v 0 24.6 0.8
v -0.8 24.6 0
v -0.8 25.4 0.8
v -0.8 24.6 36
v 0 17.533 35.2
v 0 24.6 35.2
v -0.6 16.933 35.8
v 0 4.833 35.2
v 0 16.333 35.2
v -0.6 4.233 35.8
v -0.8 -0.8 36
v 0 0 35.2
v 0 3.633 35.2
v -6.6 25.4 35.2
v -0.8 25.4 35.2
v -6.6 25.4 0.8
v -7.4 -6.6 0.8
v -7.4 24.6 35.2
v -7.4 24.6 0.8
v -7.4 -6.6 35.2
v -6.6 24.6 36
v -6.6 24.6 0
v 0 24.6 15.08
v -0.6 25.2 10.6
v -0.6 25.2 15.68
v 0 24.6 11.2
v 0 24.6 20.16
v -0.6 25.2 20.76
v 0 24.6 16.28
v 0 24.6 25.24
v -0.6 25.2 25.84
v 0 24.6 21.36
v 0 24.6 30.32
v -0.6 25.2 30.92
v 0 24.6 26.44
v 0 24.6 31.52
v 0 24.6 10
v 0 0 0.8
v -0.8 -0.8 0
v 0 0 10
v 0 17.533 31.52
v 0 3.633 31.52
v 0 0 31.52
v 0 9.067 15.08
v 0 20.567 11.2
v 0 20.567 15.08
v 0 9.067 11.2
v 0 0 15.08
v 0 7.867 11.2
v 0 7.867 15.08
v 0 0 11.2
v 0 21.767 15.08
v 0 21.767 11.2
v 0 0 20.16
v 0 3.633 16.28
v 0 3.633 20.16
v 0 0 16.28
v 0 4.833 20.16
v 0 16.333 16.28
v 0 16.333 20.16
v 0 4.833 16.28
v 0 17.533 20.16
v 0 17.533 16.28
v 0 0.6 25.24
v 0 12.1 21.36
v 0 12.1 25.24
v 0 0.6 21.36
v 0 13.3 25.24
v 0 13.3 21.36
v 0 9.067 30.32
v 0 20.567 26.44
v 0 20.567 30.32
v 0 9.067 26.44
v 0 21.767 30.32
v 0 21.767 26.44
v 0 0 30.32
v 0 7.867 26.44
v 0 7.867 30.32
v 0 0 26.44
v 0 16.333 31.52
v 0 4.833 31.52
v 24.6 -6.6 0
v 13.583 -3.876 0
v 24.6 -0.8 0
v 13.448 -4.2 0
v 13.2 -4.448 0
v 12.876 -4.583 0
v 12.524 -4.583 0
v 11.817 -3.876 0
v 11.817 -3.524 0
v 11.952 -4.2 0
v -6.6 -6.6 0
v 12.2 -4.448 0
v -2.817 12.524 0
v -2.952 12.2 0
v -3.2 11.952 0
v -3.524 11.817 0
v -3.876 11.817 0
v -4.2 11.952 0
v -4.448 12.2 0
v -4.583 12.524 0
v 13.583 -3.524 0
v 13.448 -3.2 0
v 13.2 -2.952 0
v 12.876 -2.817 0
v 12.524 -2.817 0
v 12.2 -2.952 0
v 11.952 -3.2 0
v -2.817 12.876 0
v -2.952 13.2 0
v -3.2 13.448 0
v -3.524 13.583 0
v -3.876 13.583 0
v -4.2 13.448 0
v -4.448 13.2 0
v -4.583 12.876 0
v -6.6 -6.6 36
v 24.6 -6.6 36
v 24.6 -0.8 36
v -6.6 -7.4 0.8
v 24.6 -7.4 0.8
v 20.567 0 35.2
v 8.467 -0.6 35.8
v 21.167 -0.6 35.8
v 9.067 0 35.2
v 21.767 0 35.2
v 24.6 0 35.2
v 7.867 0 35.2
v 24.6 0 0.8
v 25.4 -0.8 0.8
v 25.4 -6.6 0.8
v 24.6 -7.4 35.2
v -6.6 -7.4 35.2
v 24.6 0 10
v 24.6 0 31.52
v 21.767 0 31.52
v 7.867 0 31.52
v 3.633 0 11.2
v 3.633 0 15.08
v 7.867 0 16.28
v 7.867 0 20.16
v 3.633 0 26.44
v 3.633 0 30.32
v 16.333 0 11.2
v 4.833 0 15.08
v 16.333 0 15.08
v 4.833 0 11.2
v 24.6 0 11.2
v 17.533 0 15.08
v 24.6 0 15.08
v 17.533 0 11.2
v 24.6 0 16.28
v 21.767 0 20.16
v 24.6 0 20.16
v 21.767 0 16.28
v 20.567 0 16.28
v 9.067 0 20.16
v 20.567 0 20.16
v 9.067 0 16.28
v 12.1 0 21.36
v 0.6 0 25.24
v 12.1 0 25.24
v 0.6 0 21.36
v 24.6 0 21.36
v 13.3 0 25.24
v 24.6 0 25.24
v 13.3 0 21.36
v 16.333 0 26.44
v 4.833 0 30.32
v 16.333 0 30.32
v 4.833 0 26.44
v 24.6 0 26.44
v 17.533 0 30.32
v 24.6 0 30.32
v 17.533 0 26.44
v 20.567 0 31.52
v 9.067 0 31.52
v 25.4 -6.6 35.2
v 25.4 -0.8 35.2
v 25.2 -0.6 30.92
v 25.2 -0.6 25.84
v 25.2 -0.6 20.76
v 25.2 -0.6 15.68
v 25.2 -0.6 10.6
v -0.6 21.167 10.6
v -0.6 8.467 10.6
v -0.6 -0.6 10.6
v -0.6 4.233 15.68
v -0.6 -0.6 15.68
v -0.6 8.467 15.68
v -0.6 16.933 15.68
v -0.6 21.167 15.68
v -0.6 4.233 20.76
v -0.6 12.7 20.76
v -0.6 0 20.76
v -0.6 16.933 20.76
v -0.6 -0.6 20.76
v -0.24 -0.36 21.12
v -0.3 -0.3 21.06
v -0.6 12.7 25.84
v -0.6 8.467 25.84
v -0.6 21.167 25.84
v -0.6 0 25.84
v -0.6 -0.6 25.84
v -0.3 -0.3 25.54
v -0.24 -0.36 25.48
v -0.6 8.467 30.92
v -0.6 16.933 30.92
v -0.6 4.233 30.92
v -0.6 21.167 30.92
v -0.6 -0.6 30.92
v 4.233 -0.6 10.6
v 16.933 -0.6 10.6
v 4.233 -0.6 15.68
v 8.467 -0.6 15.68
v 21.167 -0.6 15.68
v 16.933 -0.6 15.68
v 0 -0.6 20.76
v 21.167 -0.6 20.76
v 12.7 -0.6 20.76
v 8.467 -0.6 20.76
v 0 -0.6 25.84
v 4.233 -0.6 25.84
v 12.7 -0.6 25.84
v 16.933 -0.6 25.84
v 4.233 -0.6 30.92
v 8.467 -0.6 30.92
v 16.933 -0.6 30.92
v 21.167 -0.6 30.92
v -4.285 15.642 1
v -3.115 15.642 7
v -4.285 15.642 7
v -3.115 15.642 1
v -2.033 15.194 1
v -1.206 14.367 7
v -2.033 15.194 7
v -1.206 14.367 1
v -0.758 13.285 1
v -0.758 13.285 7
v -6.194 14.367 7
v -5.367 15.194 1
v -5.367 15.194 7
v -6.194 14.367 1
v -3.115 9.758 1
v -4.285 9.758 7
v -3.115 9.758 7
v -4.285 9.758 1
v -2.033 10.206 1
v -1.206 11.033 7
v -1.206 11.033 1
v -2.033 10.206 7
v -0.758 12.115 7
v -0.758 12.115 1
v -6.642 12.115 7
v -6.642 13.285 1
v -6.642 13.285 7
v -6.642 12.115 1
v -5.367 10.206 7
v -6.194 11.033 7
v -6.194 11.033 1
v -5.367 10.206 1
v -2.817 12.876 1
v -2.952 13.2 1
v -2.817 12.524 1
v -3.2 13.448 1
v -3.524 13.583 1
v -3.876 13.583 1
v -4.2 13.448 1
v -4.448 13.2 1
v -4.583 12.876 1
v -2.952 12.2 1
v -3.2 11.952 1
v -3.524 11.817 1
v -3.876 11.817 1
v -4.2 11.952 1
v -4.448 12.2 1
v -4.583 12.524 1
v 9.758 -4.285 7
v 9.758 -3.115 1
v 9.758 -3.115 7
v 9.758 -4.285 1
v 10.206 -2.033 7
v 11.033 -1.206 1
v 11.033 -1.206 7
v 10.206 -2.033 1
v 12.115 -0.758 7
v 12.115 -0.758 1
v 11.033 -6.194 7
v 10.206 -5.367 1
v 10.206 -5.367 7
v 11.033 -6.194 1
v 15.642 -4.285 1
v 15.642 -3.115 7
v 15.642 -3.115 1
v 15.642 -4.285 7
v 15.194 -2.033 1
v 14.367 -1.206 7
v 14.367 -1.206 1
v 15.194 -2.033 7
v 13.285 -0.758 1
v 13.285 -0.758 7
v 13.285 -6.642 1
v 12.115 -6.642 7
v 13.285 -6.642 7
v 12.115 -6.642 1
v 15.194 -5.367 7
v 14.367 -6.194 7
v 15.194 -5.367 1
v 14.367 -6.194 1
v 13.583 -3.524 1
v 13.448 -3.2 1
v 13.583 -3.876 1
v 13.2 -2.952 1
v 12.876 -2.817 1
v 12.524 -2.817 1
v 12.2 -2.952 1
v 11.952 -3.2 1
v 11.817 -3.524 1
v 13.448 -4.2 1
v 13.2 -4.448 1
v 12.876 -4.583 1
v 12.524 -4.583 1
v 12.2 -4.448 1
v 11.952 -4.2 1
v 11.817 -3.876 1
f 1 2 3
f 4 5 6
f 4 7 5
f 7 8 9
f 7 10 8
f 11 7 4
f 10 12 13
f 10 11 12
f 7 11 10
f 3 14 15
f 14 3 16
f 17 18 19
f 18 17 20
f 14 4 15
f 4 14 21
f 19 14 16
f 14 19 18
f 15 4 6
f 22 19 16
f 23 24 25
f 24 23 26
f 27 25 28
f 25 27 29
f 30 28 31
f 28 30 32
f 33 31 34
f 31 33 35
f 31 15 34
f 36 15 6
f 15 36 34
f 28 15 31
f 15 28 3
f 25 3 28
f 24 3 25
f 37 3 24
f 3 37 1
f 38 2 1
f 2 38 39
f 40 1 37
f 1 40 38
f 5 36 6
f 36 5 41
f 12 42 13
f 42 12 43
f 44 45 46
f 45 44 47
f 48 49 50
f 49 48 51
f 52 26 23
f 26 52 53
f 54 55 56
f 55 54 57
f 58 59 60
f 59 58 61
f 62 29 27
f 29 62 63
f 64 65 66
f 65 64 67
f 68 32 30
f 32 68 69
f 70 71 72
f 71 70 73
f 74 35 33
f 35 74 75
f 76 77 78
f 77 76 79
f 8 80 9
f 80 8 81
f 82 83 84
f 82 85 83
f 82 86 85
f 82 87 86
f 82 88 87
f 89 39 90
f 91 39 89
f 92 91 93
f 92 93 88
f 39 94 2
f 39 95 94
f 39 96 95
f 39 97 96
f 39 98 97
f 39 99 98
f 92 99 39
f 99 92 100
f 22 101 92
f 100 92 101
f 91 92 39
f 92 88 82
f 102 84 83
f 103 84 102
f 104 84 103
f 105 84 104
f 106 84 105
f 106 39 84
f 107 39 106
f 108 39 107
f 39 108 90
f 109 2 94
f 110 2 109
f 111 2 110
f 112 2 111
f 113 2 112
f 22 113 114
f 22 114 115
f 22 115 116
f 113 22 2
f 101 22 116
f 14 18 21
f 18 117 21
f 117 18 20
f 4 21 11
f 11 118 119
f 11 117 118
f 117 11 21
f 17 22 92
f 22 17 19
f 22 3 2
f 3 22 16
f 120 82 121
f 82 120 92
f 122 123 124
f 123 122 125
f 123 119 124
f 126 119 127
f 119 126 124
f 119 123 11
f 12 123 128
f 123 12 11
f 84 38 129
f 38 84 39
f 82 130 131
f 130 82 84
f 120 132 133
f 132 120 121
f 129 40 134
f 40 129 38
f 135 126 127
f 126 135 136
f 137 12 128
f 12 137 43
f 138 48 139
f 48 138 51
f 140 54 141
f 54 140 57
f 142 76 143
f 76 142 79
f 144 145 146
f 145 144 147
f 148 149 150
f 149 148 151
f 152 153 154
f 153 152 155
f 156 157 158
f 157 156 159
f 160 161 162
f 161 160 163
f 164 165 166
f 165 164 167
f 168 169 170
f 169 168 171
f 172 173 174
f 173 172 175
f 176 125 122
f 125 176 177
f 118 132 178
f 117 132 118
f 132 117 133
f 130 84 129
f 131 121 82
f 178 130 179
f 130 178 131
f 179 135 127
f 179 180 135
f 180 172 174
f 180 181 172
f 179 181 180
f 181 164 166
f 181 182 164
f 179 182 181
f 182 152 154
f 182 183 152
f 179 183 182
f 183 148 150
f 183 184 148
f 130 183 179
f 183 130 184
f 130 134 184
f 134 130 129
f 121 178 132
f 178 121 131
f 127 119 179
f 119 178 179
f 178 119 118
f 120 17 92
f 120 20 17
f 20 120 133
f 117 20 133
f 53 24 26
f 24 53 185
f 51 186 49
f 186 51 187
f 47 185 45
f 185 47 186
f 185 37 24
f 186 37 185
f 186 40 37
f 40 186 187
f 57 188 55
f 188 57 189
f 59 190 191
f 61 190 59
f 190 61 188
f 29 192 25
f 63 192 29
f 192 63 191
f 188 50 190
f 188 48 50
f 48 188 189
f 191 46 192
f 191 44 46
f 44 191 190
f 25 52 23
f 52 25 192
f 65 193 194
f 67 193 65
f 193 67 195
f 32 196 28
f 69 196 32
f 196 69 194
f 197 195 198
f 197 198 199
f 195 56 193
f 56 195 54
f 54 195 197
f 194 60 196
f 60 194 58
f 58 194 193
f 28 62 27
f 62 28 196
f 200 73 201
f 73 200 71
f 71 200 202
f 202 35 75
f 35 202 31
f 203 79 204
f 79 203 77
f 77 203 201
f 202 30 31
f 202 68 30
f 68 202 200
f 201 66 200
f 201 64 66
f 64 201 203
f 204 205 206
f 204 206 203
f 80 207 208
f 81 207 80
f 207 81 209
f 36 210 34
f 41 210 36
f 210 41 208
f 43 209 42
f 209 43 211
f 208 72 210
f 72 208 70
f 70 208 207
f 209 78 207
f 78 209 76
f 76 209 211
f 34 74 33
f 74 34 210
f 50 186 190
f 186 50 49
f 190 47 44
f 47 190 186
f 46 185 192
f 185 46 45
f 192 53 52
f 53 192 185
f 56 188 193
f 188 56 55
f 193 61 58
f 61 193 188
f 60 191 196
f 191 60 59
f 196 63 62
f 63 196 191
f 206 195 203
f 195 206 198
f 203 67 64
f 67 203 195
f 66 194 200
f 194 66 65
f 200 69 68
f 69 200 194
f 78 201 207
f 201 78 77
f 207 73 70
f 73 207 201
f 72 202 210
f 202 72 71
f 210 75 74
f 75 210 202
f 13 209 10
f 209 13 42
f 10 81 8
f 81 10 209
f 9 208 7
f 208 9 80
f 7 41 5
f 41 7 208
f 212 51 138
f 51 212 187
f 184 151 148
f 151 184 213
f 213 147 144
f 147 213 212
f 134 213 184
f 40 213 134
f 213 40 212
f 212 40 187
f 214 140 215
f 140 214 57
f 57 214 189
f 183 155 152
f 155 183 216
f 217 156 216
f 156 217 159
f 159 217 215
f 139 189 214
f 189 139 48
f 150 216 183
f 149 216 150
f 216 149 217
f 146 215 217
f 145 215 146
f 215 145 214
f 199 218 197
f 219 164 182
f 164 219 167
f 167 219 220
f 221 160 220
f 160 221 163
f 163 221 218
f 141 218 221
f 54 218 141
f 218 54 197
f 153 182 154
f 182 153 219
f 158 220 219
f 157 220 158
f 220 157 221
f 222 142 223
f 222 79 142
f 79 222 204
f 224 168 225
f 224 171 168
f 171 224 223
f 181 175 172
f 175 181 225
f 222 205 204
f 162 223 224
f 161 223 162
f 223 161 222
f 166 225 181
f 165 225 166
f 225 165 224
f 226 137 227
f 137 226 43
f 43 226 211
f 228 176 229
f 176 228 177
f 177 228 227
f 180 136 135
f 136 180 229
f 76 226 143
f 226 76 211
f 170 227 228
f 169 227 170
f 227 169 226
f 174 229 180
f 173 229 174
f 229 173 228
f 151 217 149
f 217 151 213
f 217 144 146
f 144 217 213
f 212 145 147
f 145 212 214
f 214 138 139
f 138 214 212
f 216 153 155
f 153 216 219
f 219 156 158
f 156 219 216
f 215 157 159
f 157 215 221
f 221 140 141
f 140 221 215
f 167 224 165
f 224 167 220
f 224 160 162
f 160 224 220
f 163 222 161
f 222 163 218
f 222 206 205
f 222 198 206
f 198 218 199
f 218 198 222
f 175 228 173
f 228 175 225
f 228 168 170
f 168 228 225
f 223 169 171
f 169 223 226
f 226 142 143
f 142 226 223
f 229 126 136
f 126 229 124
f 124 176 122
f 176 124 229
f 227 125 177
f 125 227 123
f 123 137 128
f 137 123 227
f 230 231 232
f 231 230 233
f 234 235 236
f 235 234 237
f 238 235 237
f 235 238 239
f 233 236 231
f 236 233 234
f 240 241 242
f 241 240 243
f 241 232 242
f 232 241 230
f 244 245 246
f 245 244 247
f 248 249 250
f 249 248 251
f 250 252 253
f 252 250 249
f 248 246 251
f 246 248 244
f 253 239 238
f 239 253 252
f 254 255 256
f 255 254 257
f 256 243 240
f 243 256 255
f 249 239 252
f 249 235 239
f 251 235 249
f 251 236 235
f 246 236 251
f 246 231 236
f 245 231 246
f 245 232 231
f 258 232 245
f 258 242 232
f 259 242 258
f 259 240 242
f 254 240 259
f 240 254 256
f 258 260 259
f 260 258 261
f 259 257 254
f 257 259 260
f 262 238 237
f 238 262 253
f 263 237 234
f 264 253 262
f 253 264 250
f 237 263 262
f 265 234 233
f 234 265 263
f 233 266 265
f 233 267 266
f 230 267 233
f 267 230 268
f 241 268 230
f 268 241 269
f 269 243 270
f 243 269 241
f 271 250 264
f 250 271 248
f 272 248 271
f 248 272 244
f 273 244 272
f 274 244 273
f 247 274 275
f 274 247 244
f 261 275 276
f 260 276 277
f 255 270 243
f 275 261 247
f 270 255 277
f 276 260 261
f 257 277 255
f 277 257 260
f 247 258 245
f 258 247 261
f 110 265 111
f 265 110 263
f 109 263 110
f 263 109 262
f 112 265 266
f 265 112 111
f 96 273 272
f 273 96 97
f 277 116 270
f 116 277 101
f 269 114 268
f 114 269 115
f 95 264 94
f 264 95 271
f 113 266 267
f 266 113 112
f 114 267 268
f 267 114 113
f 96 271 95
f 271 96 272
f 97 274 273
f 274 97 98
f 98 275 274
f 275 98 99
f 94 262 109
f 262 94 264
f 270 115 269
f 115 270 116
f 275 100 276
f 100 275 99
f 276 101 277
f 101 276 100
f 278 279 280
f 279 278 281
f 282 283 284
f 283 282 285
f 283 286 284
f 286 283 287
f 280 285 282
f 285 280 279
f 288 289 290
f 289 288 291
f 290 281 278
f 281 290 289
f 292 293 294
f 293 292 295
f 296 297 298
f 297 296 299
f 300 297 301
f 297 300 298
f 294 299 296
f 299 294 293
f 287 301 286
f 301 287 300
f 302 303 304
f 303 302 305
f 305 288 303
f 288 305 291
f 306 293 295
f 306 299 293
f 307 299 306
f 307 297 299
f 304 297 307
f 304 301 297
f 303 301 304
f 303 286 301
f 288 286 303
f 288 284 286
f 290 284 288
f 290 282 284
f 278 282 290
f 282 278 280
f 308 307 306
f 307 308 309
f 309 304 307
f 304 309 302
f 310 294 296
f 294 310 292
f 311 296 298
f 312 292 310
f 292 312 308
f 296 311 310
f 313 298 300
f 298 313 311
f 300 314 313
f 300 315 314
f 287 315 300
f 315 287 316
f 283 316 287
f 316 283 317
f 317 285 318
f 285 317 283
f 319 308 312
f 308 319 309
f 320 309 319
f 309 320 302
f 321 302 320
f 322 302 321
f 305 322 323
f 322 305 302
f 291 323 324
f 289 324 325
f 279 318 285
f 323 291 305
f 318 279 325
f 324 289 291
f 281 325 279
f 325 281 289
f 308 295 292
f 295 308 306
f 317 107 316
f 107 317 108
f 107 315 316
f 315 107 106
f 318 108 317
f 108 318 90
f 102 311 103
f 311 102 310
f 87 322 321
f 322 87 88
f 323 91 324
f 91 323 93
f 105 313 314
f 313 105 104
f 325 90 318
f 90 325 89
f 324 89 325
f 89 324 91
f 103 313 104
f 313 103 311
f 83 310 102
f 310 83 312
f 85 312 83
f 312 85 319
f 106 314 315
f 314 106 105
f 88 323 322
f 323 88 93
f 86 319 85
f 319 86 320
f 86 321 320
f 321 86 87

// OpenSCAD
// file: wall_01_solid.scad
include <libs.scad>;

//wall
*linear_wall(4);
round_wall(2);

module linear_wall_base(size)
{
    translate([-wall_width*basis/2,size*basis/2,wall_height/2])hull()
    {
        cube([wall_width*basis-bevel*2,size*basis,wall_height-bevel*2],center=true);
        cube([wall_width*basis-bevel*2,size*basis-bevel*2,wall_height],center=true);
        cube([wall_width*basis,size*basis-bevel*2,wall_height-bevel*2],center=true);
    }
}

module round_wall_base(size)
{
    difference()
    {
        hull()
        {
            translate([0,0,bevel])cylinder(r=size*basis+basis*wall_width,h=wall_height-bevel*2);
            cylinder(r=size*basis+basis*wall_width-bevel,h=wall_height);
        }
        cylinder(r=size*basis,h=wall_height);
        translate([0,0,-ep])cylinder(r1=size*basis+bevel,r2=size*basis,h=bevel);
        translate([0,0,wall_height-bevel+ep])cylinder(r2=size*basis+bevel,r1=size*basis,h=bevel);
    }
}

module linear_brick_grids(size)
{
    //one for each wall level, horizontal
    brick_h=(wall_height-floor_thick)/wall_layers;
    for (ii=[0:wall_layers-1])
    {
        translate([0,size*basis/2,floor_thick+ii*brick_h])rotate([0,45,0])cube([wall_groove*sqrt(2),size*basis*2,wall_groove*sqrt(2)],center=true);
    }
    //vertical
    //one above floor is off by half, then even, then off
    for (ii=[1:1:wall_layers])
    {
        for(jj=[0:.5:size+1])
        {
            translate([0,jj*basis-(ii%6)*basis/6,floor_thick+ii*brick_h-brick_h/2])rotate([0,0,45])cube([wall_groove*sqrt(2),wall_groove*sqrt(2),brick_h],center=true);
        }
    }
}

module round_brick_grids(size)
{
    brick_h=(wall_height-floor_thick)/wall_layers;
    //horizontal
    for (ii=[0:wall_layers-1])
    {
        translate([0,0,floor_thick+ii*brick_h])hull()
        {
            cylinder(r=basis*size+wall_groove,h=ep,center=true);
            cylinder(r=basis*size,h=wall_groove*2,center=true);
        }
    }
    //vertical
    //vertical should be shifted each layer
    for (ii=[1:1:wall_layers])
    {
        for(jj=[0:30/size:120])
        {
            rotate([0,0,jj+(ii%6)*(10/size)])translate([basis*size,0,floor_thick+ii*brick_h-brick_h/2])rotate([0,0,45])cube([wall_groove*sqrt(2),wall_groove*sqrt(2),brick_h],center=true);
        }
    }
}

module round_wall(size)
{
    xx=basis*size+basis*wall_width;
    yy=basis*size+basis*wall_width;
    zz=wall_height;
    difference()
    {
        intersection()
        {
            round_wall_base(size);
            translate([.5*(basis*size+basis*wall_width),.5*(basis*size+basis*wall_width),wall_height/2])hull()
            {
                cube([xx-bevel*2,yy,zz-bevel*2],center=true);
                cube([xx-bevel*2,yy-bevel*2,zz],center=true);
                cube([xx,yy-bevel*2,zz-bevel*2],center=true);
            }
        }
        hull()
        {
            cube([basis*size*2+bevel*2,ep,zz*3],center=true);
            cube([ep,basis*size*2+bevel*2,zz*3],center=true);
        }
        round_brick_grids(size);
    }
}

module linear_wall(size)
{
    difference()
    {
        linear_wall_base(size);
        linear_brick_grids(size);
        *translate([-wall_width*basis,0,0])linear_brick_grids(size);
    }
}
// file: corner_01_solid.scad
include <libs.scad>;
use <wall_01_solid.scad>;

convex_linear();
//concave_linear();
module convex_linear()
{
  difference()
  {
    intersection()
    {
      //two sides meeting
      union()
      {
        translate([0,-basis,0])linear_wall_base(2);
        rotate([0,0,90])translate([0,-basis,0])linear_wall_base(2);
      }
      //cut down the part that sticks out the back
      translate([basis-wall_width*basis,basis-wall_width*basis,wall_height/2])hull()
      {
        cube([2*basis-bevel*2,2*basis-bevel*2,wall_height],center=true);
        cube([2*basis-bevel*2,2*basis,wall_height-bevel*2],center=true);
        cube([2*basis,2*basis-bevel*2,wall_height-bevel*2],center=true);
      }
    }
    
    
      intersection()
      {
        linear_brick_grids(1);
        translate([-wall_groove,0,0])cube([2*basis,2*basis,wall_height]);
        
      }
      intersection()
      {
        rotate([0,0,90])translate([0,-basis,0])linear_brick_grids(1);
        translate([0,-wall_groove,0])cube([2*basis,2*basis,wall_height]);
      }
      intersection()
      {
        linear_brick_grids(1);
        rotate([0,0,90])translate([0,-basis,0])linear_brick_grids(1);
      }
    
  }
}

module concave_linear()
{
  difference()
  {
    //two sides meeting
    union()
    {
      translate([0,0,0])linear_wall_base(1);
      rotate([0,0,-90])translate([0,-basis,0])linear_wall_base(1);
    }
    //apply brick pattern
    linear_brick_grids(1);
    rotate([0,0,-90])translate([0,-basis,0])linear_brick_grids(1);
  }
}
// main file
include <libs.scad>;
use <corner_01_solid.scad>;

*concave_final();
convex_final();

module concave_final()
{
  intersection()
  {
    import("concave_linear_solid_chipped_c.stl");
    translate([0,0,wall_height/2-ep+floor_thick])cube([1*3*basis,1*3*basis,wall_height],center=true);
  }

  intersection()
  {
    cube([1*3*basis,1*3*basis,2*(floor_thick)],center=true);
    difference()
    {
      concave_linear(1);
      linear_mag_holes(1);
      rotate([0,0,-90])translate([0,-basis,0])linear_mag_holes(1);
    }
  }
}

module convex_final()
{
  intersection()
  {
    *import("convex_linear_solid.stl");
    convex_linear();
    translate([0,0,wall_height/2-ep+floor_thick])cube([1*3*basis,1*3*basis,wall_height],center=true);
  }

  intersection()
  {
    cube([1*3*basis,1*3*basis,2*(floor_thick)],center=true);
    difference()
    {
      convex_linear(1);
      linear_mag_holes(1);
      rotate([0,0,90])translate([0,-basis,0])linear_mag_holes(1);
    }
  }
}
